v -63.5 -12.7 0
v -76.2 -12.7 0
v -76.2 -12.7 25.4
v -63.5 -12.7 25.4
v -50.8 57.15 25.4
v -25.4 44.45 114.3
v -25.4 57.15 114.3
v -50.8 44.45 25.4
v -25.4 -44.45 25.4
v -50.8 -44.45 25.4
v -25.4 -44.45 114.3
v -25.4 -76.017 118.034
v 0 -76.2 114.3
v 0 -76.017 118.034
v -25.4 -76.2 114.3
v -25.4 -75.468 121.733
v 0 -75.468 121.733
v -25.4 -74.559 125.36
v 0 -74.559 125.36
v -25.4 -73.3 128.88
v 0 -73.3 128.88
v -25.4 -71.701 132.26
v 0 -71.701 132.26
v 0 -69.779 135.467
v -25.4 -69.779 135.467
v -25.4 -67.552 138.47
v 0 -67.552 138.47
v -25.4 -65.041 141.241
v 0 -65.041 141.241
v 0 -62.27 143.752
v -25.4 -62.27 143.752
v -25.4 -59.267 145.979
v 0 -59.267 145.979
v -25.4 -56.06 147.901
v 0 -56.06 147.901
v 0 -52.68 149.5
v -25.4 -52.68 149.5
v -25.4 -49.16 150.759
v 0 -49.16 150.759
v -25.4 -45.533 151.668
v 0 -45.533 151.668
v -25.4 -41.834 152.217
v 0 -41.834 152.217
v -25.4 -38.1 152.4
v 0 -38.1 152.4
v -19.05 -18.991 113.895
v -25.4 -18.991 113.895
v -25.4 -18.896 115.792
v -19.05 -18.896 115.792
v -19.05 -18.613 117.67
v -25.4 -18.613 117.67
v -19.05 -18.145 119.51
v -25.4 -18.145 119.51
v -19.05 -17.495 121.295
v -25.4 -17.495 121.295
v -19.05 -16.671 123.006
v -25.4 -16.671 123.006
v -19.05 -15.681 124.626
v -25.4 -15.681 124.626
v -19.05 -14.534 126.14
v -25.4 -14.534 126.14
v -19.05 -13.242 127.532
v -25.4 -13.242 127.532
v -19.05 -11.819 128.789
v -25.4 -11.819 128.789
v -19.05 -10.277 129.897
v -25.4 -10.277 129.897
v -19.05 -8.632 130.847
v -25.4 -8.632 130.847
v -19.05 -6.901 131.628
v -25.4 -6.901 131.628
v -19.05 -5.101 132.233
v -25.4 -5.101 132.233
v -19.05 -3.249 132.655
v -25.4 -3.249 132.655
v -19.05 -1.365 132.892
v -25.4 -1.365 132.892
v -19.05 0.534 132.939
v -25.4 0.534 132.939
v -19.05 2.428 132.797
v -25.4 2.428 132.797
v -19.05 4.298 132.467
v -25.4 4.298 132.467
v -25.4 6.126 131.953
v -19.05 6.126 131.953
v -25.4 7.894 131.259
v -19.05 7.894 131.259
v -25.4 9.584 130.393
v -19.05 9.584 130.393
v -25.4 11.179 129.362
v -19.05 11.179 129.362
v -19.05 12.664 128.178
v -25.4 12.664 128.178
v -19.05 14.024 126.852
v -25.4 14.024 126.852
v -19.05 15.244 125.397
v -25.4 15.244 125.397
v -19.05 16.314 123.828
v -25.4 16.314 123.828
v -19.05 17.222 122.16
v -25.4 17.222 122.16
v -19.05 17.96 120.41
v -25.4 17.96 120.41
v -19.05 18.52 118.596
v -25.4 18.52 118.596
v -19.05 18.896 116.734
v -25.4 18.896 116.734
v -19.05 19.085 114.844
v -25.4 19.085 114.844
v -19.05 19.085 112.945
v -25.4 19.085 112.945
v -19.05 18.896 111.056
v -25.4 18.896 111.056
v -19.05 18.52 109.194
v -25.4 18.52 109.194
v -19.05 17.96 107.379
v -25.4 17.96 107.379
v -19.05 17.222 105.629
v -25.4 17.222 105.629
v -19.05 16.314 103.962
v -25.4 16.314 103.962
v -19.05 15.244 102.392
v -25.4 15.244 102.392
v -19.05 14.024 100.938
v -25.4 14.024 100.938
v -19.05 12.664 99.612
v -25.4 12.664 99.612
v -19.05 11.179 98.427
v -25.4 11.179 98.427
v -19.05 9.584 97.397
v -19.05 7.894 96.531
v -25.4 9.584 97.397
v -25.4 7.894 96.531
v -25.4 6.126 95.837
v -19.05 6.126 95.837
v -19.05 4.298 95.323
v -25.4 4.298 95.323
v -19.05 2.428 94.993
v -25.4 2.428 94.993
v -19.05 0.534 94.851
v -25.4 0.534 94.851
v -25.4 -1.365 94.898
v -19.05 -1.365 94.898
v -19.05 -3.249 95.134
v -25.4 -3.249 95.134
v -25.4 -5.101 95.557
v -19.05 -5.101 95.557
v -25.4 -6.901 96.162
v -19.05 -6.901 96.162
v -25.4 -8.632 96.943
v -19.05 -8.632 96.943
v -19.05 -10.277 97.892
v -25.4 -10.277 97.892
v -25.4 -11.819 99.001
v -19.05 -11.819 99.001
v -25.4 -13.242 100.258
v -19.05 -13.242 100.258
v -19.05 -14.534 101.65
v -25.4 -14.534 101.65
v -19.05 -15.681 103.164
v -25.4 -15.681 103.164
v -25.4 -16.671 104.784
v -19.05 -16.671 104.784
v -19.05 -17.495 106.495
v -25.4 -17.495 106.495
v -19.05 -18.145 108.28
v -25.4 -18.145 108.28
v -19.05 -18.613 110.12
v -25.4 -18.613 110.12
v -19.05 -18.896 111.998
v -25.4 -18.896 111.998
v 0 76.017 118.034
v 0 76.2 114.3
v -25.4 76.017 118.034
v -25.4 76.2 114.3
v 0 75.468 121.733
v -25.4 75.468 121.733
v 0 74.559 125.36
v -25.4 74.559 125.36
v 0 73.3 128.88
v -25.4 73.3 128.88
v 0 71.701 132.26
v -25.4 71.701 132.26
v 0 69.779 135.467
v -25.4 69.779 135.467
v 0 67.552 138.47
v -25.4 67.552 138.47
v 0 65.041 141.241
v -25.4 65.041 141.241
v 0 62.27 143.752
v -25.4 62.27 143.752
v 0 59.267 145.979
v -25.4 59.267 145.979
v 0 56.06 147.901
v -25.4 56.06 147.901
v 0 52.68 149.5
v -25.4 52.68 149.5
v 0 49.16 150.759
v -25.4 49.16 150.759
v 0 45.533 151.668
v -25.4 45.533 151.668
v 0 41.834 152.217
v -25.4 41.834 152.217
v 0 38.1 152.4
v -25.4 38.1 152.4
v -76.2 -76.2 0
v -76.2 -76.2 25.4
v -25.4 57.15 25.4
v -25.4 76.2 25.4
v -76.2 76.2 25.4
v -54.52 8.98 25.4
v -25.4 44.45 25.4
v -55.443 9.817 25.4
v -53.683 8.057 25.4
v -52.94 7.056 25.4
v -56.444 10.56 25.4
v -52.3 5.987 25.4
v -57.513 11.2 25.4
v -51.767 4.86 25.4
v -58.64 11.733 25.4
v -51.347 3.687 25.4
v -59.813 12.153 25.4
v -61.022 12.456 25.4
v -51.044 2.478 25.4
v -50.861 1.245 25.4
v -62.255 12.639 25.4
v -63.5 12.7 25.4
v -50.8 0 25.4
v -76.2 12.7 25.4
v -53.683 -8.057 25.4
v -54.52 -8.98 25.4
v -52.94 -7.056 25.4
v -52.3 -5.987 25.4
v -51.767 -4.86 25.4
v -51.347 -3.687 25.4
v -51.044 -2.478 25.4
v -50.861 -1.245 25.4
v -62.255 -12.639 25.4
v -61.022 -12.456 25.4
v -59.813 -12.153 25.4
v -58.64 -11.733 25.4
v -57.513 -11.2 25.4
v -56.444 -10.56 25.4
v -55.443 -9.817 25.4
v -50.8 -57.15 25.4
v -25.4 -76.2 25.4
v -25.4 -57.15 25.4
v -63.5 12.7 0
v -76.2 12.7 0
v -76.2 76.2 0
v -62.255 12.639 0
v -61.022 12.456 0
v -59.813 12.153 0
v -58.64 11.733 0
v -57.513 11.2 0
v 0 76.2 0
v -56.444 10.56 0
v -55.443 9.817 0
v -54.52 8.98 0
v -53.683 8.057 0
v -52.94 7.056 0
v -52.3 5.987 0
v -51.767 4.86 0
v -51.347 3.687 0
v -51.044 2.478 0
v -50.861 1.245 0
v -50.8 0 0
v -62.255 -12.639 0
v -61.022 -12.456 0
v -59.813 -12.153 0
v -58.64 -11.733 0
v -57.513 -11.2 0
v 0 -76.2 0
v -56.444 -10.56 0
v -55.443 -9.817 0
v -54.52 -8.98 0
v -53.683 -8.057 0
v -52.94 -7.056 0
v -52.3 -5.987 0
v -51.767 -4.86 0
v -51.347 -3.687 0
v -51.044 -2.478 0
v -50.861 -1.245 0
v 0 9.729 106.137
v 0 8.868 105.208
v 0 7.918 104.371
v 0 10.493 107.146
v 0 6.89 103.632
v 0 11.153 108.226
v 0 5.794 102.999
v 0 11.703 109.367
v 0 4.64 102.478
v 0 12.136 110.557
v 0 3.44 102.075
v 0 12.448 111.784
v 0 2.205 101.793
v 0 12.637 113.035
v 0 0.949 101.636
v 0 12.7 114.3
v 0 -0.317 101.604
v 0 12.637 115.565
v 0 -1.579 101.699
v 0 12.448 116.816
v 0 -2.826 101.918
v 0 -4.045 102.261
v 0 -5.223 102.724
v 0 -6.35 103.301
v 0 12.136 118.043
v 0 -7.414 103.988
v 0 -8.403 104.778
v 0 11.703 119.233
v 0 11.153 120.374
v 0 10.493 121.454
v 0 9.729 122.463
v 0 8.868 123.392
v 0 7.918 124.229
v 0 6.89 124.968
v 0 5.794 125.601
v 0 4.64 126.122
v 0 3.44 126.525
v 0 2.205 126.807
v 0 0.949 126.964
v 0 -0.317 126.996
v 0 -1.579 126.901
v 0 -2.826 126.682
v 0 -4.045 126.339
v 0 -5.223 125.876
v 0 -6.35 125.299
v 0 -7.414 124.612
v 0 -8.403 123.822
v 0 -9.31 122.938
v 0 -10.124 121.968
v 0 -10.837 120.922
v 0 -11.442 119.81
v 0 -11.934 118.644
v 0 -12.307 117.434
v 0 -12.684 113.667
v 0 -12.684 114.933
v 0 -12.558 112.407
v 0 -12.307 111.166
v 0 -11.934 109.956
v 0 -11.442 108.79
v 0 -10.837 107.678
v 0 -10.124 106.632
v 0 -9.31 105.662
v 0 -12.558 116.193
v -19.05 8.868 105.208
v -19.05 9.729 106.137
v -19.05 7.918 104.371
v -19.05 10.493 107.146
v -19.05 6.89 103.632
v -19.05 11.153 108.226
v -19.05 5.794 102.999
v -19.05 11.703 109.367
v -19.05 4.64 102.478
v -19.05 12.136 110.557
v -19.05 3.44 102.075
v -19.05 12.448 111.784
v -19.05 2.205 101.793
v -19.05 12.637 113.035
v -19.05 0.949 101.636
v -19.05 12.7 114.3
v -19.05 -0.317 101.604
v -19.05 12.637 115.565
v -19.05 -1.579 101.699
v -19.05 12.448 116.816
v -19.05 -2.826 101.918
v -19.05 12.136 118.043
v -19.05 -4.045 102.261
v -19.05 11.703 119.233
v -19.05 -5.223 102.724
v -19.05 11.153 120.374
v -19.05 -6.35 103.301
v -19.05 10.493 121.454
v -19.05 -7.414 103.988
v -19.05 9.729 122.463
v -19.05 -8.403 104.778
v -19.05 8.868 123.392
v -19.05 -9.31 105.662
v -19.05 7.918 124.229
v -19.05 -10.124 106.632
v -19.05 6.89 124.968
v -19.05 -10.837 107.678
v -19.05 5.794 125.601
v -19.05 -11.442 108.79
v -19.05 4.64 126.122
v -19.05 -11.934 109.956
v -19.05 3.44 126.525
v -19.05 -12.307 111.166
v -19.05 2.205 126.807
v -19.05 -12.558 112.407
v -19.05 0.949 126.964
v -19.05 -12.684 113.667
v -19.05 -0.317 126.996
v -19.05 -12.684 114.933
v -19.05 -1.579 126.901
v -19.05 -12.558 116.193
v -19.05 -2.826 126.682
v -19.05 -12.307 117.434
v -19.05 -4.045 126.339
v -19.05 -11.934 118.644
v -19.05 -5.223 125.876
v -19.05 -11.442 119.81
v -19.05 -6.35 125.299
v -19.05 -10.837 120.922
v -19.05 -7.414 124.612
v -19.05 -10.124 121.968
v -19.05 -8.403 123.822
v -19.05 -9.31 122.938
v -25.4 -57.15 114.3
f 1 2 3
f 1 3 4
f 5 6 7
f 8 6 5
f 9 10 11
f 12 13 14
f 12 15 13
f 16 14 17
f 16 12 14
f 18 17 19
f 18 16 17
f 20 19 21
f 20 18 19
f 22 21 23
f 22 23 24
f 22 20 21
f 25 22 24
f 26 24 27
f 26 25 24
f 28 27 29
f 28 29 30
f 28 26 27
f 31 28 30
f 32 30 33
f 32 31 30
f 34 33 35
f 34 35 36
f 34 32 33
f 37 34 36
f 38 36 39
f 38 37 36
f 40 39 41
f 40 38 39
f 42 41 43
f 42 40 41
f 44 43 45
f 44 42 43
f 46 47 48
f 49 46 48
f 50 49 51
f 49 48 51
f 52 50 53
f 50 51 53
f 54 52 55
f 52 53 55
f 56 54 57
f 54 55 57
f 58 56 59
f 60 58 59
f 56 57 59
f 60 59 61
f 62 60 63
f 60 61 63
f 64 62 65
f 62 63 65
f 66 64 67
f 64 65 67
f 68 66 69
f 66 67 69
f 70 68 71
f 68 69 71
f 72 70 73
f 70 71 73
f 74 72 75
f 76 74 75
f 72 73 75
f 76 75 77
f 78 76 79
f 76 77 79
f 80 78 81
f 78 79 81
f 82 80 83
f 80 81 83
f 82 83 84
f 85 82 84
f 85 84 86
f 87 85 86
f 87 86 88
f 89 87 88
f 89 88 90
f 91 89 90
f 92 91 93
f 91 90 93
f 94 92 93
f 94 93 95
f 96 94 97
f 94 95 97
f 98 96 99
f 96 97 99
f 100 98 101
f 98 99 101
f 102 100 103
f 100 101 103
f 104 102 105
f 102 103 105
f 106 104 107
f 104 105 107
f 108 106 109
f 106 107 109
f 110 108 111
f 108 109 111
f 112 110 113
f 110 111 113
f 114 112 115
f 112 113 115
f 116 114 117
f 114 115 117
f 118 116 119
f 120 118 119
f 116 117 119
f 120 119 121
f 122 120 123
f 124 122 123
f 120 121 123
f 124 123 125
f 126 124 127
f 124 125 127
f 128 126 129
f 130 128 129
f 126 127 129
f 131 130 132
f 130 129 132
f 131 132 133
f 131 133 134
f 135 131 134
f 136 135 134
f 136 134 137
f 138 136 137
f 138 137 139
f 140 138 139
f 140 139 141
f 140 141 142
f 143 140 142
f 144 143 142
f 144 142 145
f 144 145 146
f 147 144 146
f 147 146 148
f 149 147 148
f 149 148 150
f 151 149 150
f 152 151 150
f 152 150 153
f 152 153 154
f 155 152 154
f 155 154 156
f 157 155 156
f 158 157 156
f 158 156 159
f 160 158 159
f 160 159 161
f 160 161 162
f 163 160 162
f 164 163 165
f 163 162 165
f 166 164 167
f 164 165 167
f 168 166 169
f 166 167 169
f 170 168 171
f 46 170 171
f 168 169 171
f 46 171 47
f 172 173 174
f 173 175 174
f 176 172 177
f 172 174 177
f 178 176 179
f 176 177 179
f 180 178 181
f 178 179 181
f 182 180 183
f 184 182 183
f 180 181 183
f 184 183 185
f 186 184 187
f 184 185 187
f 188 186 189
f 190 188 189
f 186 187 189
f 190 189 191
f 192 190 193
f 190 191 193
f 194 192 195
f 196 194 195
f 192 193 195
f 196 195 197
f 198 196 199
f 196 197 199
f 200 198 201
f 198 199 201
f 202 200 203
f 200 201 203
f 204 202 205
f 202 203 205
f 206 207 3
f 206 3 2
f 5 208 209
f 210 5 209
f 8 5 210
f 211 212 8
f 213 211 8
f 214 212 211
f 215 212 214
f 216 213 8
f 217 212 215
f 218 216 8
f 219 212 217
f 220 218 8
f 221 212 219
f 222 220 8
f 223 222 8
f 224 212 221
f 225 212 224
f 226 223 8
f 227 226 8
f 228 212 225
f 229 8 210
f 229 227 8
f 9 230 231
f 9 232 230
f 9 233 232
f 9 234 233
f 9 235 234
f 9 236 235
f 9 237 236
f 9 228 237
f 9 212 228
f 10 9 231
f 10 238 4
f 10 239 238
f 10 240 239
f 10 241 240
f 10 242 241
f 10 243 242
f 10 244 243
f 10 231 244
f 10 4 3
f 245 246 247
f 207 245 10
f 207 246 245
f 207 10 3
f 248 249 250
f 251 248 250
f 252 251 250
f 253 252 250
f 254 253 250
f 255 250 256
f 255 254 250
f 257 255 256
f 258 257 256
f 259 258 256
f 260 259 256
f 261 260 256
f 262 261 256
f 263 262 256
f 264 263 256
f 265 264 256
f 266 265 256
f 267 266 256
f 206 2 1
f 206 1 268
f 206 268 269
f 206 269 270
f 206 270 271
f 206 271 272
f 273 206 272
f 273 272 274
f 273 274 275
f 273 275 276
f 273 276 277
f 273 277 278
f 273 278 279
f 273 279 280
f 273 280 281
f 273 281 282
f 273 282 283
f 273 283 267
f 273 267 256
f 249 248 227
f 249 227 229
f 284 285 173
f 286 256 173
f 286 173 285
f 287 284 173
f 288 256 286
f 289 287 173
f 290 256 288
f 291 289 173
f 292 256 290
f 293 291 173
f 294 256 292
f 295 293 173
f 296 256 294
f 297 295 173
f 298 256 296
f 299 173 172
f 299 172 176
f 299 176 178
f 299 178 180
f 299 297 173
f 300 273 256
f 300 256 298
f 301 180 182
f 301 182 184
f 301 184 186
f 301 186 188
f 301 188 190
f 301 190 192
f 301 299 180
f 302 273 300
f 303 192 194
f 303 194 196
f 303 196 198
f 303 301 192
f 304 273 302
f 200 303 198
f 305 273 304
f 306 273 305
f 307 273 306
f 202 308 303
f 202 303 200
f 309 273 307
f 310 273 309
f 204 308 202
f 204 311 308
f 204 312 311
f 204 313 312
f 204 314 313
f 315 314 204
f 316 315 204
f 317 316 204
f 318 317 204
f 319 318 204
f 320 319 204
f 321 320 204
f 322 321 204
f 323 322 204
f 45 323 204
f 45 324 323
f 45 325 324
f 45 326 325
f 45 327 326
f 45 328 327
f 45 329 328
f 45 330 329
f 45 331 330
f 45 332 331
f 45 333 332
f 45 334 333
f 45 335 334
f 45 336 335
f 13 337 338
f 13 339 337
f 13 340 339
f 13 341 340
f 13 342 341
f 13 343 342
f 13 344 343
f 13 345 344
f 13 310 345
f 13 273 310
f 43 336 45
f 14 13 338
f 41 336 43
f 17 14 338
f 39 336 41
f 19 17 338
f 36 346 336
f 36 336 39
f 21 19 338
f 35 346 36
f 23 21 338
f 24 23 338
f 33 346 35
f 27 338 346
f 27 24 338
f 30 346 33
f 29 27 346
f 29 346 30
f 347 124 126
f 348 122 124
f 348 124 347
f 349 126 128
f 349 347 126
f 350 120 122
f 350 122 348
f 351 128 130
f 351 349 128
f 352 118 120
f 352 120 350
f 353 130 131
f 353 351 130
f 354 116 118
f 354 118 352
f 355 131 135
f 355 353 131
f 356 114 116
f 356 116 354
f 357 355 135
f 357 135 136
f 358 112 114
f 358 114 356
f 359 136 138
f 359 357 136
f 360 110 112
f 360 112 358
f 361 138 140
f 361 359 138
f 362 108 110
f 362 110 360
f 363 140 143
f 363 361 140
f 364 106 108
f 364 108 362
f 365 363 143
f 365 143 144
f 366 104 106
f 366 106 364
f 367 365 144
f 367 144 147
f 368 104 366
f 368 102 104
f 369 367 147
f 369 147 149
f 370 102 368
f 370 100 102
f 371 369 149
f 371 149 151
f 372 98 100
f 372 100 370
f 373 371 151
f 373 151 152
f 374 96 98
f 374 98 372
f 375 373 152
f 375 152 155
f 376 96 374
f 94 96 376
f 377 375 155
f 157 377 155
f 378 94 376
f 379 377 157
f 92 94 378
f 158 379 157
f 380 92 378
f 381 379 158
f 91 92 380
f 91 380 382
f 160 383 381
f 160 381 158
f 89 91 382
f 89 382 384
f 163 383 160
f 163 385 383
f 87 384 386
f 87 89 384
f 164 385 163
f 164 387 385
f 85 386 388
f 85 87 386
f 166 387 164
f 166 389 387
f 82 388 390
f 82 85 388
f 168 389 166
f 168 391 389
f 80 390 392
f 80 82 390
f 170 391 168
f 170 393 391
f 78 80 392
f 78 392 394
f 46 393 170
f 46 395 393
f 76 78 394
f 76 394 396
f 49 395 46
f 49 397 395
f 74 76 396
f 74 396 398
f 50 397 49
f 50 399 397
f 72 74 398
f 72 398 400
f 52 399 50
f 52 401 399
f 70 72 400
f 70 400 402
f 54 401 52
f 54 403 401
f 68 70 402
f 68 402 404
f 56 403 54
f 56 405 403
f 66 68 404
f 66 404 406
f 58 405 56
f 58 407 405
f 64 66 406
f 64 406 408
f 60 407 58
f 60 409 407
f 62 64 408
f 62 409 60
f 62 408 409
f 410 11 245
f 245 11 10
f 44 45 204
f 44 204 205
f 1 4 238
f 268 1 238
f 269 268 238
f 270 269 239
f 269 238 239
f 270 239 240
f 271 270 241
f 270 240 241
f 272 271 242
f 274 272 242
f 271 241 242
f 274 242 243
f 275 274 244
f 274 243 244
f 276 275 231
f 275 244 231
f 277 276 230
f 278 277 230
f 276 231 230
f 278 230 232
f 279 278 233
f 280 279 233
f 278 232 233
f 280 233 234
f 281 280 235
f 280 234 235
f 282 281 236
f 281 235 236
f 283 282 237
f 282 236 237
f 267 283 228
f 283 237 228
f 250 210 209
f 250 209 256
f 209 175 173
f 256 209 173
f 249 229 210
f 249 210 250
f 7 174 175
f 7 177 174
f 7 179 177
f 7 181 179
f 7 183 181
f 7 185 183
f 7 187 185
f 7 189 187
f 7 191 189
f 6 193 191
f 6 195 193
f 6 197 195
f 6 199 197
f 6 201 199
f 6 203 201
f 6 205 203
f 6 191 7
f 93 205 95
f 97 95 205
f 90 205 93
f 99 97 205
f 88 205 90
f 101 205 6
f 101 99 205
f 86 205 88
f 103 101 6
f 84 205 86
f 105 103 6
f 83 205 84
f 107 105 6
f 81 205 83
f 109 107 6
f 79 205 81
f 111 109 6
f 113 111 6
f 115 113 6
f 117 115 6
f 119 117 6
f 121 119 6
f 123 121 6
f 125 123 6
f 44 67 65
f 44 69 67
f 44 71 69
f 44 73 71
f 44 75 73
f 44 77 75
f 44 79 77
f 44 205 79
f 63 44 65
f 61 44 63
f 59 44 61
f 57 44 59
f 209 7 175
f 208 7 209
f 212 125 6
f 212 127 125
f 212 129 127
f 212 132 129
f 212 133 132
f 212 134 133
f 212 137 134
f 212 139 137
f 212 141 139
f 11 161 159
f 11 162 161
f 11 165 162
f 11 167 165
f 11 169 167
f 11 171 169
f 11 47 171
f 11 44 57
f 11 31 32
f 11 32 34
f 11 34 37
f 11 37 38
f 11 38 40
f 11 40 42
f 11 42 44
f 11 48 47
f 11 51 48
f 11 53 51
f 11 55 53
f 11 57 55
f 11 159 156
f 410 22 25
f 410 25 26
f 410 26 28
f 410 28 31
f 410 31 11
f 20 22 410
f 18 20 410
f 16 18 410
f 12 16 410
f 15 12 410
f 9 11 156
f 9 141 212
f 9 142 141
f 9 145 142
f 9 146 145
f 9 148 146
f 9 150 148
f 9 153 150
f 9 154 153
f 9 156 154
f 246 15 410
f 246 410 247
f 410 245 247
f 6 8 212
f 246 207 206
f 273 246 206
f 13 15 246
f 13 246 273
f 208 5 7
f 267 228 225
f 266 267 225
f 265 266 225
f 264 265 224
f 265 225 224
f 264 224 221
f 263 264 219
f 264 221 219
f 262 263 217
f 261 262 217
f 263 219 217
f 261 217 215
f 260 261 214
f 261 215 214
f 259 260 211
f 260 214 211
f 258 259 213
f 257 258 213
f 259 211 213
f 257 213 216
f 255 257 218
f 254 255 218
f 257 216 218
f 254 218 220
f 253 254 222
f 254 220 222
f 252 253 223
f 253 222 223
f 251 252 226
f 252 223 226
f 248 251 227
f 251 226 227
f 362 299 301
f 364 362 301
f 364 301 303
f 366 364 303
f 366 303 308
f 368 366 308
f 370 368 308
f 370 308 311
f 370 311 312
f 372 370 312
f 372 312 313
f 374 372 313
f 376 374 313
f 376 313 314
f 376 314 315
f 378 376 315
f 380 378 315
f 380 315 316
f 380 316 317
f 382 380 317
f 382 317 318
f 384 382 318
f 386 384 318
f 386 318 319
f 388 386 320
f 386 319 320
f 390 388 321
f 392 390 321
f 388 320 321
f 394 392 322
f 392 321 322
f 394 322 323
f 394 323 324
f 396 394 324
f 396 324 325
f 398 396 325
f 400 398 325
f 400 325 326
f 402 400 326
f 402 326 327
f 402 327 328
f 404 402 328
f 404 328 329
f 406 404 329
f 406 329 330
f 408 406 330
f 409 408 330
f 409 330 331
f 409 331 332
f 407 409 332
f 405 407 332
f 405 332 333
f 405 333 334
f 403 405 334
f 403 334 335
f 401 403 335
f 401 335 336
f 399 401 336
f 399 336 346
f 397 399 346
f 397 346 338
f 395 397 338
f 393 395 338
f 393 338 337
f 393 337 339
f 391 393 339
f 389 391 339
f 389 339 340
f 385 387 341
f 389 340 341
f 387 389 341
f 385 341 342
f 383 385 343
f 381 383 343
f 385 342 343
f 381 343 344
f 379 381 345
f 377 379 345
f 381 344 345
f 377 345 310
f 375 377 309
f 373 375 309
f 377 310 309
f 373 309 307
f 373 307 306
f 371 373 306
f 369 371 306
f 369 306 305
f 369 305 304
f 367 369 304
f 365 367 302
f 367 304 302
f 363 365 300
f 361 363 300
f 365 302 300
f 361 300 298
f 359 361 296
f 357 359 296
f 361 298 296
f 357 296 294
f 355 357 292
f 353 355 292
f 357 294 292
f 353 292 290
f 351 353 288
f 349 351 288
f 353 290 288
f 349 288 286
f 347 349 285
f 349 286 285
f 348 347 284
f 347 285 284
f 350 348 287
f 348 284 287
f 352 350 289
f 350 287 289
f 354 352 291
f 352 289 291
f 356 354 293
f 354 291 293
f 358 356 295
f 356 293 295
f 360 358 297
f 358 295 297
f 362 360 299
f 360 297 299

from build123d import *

# Parameters (mm, degrees)
F1_DEPTH  = 76.2
F2_R      = 12.7
F3_DEPTH  = 76.201
F5_DEPTH  = 46.736
F6_R      = 19.05
F7_DEPTH  = 6.35
F8_R      = 38.1
F11_DEPTH = 12.7


# Not quite as in the source:
# - a pattern or mirror of a feature is missing from the dataset's text; its kind, count and spacing are read off the source's solid


with BuildPart() as f1:
    # F0 (on Front) → F1 (new body, symmetric)
    with BuildSketch(Plane.XZ):
        Polygon((-76.2, 0), (0, 0), (0, 152.4), (-25.4, 152.4), (-25.4, 25.4), (-76.2, 25.4), align=None)
    extrude(amount=F1_DEPTH, both=True)

    # F2 (on Right) → F3 (cut, through all)
    with BuildSketch(Plane.YZ):
        with Locations((0, 114.3)):
            Circle(F2_R)
    extrude(amount=-F3_DEPTH, mode=Mode.SUBTRACT)

    # F4 (on face) → F5 (cut)
    with BuildSketch(Plane.XY.offset(25.4)):
        with BuildLine():
            ThreePointArc((-63.5, -12.7), (-54.5197438789, -8.9802561211), (-50.8, 0))
            ThreePointArc((-50.8, 0), (-54.5197438789, 8.9802561211), (-63.5, 12.7))
            Line((-63.5, 12.7), (-76.2, 12.7))
            Line((-76.2, 12.7), (-76.2, -12.7))
            Line((-76.2, -12.7), (-63.5, -12.7))
        make_face()
    extrude(amount=-F5_DEPTH, mode=Mode.SUBTRACT)

    # F6 (on face) → F7 (cut)
    with BuildSketch(Plane(origin=(-25.4, 0, 0), x_dir=(0, -1, 0), z_dir=(-1, 0, 0))):
        with Locations((-0.0589386239, 113.8949071477)):
            Circle(F6_R)
    extrude(amount=-F7_DEPTH, mode=Mode.SUBTRACT)

    # F8
    f8_edges = [f1.edges().sort_by_distance(p)[0] for p in [
        (-12.7, 76.2, 152.4),
        (-12.7, -76.2, 152.4),
    ]]
    fillet(f8_edges, radius=F8_R)

    # F10 (on offset) → F11 (join)
    with BuildSketch(Plane.XZ.offset(44.45)):
        Polygon((-25.4, 25.4), (-25.4, 114.3), (-50.8, 25.4), align=None)
    f11 = extrude(amount=F11_DEPTH)

    # F11_copies: F11 across plane
    add(f11.mirror(Plane.ZX))


solid = f1.part
